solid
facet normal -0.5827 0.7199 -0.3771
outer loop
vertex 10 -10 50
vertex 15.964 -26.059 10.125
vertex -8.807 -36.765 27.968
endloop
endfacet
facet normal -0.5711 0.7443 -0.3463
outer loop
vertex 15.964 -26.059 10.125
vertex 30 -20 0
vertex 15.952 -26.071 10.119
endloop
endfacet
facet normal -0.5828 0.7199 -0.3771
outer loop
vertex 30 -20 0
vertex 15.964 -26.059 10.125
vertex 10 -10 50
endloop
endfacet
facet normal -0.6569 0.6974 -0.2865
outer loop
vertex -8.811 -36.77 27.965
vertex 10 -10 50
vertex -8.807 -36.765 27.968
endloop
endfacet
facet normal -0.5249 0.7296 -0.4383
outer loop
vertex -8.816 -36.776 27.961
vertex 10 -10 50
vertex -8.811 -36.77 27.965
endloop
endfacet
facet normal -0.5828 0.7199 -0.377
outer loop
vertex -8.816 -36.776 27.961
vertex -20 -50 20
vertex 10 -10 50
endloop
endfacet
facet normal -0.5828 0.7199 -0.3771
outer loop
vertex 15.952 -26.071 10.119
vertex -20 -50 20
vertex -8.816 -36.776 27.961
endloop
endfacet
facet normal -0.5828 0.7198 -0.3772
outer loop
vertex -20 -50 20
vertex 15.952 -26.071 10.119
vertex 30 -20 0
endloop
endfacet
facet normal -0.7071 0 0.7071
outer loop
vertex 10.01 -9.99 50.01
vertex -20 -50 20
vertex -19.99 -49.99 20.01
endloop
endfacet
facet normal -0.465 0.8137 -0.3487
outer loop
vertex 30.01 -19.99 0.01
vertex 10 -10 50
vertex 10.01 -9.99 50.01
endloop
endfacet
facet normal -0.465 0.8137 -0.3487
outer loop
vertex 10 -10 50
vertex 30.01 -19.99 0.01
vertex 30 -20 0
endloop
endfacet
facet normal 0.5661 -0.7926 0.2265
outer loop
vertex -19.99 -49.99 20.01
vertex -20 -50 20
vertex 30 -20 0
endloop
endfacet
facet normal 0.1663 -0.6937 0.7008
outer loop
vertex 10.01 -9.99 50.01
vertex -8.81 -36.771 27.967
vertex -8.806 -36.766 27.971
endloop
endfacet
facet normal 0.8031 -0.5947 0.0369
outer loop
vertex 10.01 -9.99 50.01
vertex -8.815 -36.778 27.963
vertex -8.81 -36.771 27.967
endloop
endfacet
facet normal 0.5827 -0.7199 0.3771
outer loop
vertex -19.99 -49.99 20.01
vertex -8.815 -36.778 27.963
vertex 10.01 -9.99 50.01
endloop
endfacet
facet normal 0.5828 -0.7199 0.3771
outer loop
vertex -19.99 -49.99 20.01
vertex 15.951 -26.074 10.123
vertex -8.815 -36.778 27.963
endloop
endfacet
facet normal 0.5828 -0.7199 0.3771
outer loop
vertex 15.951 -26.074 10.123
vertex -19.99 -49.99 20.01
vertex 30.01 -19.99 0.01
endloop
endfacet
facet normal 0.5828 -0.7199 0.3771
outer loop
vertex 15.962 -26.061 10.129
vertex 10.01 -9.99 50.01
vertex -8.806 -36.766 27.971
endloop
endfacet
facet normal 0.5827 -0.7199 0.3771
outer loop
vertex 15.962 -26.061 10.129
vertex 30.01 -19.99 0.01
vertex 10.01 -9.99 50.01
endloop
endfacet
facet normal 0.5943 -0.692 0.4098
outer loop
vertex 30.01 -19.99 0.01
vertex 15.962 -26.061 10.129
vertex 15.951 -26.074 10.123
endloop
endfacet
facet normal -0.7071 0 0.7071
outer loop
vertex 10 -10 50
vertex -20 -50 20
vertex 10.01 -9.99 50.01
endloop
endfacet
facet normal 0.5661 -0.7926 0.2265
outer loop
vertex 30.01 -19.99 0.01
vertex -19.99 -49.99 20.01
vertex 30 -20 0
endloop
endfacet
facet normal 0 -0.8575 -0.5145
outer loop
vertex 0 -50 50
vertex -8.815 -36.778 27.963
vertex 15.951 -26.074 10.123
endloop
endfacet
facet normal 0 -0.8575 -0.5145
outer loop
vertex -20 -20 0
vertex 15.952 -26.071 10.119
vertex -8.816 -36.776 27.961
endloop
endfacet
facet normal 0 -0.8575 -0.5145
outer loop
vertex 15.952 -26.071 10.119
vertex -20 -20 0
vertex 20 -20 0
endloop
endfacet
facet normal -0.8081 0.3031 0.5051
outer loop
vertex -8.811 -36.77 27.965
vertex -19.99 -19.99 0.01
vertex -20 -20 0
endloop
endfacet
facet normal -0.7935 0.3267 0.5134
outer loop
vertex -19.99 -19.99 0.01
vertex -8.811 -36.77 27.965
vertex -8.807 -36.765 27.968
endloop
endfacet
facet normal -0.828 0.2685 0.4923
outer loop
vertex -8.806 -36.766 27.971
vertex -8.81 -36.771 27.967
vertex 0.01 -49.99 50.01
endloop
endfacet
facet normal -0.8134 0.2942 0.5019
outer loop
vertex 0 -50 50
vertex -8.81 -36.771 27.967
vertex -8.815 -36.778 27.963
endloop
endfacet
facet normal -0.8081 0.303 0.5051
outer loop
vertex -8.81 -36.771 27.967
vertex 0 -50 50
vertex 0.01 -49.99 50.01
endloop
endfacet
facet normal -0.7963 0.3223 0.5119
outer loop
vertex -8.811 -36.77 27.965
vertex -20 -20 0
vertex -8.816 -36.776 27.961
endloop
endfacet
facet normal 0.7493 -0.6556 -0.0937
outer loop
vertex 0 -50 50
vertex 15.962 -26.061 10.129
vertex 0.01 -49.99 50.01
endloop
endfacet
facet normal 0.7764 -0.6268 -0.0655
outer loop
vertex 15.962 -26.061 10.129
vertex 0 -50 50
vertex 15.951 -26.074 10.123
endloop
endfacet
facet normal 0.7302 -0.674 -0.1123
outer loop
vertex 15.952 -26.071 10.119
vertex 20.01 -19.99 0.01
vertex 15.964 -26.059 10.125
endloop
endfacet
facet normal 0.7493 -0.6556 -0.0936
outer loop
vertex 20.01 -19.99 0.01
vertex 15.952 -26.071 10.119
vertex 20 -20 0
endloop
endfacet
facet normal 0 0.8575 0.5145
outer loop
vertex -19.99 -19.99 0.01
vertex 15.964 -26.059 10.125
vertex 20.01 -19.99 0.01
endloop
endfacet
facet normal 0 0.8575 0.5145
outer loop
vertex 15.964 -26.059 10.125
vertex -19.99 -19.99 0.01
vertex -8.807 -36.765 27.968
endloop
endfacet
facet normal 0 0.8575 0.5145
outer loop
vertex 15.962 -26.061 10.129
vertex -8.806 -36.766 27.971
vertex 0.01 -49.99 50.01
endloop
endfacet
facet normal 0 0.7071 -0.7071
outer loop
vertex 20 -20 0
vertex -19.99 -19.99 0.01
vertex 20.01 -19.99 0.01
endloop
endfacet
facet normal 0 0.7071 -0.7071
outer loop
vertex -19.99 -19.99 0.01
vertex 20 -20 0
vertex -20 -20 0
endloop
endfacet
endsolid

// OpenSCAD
// file: deskriptiva.scad
module unitTriangle() {
	linear_extrude(0.01)
	polygon([[0, 0], [u, 0], [0, u]]);
}

module unitParallelogram() {
	linear_extrude(0.01)
	polygon([[0, 0], [u, 0], [0, u], [-u, u]]);
}

module unitPyramid(n) {
	step = 360 / n;
		hull() {
		for (i = [0: n]) {
			translate([cos(i*step) * u, sin(i*step) * u, 0]) cube(0.01, center=true);
		}
		translate([0, 0, u]) cube(0.01, center=true);
	}
}

module unitLine() {
	translate([u/2, 0, 0]) cube([u, 0.01, 0.01], center=true);
}

module magnify(thickness) {
	minkowski() {
		children();
		sphere(thickness);
	}
}

module transform(A, B, C) {
	// all y coords are switched
    dA = [0, 0, 0];
    dB = [B.x - A.x, - B.y + A.y, B.z - A.z];
    dC = [C.x - A.x, - C.y + A.y, C.z - A.z];
    m = [
        [dB.x, dC.x, 1, u*A.x],
        [dB.y, dC.y, 1, -u*A.y],
        [dB.z, dC.z, 1, u*A.z],
        [0, 0, 0, 1]
    ];
    
    multmatrix(m) children();
} 

module oneAxisTransform(S, A, V) {
	// all y coords are switched
    dS = [0, 0, 0];
    dA = [A.x - S.x, - A.y + S.y, A.z - S.z];
    dV = [V.x - S.x, - V.y + S.y, V.z - S.z];
	dANormal = cross([0, 0, 1], dA);
    m = [
        [dA.x, dANormal.x, dV.x, u*S.x],
        [dA.y, dANormal.y,dV.y, -u*S.y],
        [dA.z, dANormal.z, dV.z, u*S.z],
        [0, 0, 0, 1]
    ];
    
    multmatrix(m) children();
}
// main file
u = 10;
include<deskriptiva.scad>

color("Lime")
transform([-2, 5, 2], [3, 2, 0], [1, 1, 5])
unitTriangle();

color("Yellow")
transform([-2, 2, 0], [0, 5, 5], [2, 2, 0])
unitTriangle();
